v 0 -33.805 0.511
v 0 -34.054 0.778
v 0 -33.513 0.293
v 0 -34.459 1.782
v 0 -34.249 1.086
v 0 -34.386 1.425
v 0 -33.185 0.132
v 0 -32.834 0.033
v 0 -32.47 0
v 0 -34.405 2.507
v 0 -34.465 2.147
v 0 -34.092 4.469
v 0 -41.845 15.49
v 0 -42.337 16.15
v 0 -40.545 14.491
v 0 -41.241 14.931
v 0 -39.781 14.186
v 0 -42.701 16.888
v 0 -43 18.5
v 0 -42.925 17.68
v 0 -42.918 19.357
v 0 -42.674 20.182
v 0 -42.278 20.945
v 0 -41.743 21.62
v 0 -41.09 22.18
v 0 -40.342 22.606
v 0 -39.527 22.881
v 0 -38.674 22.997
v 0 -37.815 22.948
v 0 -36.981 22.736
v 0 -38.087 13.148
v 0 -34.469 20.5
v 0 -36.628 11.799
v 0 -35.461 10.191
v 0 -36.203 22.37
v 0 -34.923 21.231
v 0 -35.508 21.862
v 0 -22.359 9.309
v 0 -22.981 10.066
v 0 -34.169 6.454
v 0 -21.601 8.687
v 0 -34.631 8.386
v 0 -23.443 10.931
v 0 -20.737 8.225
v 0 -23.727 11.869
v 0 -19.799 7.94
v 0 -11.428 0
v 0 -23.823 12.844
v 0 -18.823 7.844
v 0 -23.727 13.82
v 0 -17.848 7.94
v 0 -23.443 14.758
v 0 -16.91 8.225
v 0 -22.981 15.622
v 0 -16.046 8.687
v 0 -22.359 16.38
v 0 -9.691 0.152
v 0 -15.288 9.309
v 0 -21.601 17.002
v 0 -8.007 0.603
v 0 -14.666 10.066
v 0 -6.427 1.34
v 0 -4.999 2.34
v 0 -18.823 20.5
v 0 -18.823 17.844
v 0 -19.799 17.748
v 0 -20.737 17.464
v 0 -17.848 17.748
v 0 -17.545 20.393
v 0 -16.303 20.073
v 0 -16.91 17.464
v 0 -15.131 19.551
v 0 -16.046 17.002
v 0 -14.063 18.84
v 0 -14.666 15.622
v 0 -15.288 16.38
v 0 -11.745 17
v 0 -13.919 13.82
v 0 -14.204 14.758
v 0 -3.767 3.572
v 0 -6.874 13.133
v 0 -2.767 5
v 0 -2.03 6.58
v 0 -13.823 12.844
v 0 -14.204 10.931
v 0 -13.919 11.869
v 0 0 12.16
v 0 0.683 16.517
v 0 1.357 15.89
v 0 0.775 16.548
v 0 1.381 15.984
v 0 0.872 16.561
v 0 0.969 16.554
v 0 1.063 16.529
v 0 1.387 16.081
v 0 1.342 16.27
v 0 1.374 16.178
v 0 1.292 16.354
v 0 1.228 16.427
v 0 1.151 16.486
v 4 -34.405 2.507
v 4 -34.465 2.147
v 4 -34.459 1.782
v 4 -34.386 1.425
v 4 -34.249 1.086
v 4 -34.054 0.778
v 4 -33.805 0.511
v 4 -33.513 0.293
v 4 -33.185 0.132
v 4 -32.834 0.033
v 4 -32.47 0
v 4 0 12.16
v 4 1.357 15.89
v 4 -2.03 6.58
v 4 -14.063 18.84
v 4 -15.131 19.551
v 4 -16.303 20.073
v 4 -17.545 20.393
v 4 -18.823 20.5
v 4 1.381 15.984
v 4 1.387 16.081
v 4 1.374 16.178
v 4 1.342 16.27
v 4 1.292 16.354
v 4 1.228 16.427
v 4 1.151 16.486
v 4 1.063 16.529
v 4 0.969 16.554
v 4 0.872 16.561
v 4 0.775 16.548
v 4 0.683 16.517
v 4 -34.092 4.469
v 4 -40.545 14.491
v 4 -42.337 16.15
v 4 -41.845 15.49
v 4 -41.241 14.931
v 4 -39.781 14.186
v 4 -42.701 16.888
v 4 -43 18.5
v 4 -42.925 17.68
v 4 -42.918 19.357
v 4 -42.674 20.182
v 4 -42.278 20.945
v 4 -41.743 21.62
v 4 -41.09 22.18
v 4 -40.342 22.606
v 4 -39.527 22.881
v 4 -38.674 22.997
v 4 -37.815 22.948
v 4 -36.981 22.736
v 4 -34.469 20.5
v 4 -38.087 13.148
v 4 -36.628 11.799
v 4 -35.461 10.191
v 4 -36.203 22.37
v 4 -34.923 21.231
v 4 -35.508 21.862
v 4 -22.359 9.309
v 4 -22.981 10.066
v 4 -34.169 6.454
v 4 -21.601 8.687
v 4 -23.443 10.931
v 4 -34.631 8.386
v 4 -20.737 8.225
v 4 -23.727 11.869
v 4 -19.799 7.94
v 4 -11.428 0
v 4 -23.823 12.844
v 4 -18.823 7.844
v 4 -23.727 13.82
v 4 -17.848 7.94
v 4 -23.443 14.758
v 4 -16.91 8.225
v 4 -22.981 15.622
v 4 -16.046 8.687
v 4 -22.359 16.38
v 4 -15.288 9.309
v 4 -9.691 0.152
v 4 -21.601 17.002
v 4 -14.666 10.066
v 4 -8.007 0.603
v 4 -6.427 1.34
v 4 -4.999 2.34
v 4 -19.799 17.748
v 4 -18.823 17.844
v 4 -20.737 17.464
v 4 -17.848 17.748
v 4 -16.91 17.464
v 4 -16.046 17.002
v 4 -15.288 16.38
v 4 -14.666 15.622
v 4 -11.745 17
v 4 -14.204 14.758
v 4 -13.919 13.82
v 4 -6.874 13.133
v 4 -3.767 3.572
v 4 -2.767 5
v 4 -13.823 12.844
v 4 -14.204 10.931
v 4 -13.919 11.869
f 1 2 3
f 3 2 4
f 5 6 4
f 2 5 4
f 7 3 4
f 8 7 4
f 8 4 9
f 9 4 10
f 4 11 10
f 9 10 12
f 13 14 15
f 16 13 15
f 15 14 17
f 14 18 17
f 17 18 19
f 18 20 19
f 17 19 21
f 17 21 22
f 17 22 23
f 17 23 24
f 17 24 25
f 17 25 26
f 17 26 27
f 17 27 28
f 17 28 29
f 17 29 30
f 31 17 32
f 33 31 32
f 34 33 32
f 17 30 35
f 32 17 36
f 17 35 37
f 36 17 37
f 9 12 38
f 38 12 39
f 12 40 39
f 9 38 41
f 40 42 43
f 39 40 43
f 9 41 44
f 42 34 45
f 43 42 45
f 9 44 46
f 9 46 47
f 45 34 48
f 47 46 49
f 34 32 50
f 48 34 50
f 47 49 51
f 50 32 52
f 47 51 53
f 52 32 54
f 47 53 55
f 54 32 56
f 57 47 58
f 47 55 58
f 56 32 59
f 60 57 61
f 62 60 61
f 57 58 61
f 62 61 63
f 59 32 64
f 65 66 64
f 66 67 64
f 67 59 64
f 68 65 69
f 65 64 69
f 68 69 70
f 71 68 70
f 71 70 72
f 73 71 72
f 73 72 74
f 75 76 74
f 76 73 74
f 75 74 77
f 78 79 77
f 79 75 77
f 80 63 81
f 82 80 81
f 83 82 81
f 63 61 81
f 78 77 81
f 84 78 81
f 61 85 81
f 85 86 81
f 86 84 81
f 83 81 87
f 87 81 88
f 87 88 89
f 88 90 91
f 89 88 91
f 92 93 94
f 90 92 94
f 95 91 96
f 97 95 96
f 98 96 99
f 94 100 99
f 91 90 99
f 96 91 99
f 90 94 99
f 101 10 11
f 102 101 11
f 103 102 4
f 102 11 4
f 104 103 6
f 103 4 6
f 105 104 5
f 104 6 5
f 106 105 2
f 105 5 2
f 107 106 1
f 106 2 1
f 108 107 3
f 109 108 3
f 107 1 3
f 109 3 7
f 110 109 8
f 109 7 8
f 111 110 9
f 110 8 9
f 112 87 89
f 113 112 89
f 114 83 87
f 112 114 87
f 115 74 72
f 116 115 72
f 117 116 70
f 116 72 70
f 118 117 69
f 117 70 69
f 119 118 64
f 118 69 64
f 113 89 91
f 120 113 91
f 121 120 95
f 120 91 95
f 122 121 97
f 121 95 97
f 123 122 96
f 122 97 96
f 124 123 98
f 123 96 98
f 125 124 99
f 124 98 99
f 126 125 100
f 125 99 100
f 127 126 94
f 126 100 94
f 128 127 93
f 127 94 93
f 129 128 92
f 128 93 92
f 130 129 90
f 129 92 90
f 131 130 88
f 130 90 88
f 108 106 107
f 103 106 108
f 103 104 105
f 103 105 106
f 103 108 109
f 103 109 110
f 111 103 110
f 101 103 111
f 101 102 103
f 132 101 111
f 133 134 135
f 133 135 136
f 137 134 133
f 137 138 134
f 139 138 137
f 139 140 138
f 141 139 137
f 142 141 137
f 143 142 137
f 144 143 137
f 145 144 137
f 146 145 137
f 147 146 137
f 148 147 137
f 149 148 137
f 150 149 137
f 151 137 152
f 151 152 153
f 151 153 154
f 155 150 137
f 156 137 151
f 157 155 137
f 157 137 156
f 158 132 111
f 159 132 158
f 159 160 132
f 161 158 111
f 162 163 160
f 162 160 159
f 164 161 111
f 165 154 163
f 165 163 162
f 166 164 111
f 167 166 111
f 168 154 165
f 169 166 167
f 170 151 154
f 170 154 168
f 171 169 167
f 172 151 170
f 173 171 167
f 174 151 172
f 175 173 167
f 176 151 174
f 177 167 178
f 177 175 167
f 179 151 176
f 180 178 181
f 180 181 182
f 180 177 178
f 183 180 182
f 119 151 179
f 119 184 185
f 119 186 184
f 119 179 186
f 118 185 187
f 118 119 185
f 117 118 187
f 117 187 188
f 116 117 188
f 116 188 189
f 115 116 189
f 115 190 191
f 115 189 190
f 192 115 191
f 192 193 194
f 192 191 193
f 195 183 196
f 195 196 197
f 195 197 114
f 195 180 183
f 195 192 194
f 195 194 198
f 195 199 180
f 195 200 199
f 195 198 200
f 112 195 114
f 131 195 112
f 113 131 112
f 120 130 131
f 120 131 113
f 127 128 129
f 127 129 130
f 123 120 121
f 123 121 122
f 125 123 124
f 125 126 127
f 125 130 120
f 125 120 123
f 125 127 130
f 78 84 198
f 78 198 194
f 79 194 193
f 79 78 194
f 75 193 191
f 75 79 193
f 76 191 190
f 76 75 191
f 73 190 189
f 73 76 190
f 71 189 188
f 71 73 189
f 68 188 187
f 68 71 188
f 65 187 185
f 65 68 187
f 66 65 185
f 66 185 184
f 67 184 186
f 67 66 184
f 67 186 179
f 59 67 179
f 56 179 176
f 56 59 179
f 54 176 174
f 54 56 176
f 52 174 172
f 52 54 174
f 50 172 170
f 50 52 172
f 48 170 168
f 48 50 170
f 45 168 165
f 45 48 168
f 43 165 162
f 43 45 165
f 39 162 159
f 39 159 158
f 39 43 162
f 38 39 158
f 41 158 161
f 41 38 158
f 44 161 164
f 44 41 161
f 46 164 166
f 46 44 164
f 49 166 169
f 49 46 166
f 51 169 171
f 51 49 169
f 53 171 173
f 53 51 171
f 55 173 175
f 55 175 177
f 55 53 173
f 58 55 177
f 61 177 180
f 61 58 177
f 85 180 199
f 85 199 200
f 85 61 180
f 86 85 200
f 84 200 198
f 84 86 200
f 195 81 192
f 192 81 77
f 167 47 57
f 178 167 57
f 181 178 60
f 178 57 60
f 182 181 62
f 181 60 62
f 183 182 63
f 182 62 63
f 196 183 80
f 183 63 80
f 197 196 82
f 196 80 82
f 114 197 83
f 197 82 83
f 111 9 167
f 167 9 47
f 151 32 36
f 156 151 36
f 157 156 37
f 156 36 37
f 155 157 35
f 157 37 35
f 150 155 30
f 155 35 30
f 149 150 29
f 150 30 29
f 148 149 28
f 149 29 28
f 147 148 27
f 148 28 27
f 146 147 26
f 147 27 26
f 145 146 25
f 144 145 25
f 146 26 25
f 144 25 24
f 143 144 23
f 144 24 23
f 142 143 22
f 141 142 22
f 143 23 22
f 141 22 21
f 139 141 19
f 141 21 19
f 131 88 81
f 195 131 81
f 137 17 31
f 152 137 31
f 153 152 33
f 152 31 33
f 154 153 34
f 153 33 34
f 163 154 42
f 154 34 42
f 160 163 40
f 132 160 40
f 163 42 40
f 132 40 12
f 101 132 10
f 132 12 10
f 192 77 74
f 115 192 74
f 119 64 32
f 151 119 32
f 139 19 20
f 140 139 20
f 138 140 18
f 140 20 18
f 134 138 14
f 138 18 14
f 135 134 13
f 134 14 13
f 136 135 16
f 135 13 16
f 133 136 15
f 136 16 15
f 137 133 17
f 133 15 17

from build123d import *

# Parameters (mm, degrees)
F0_R     = 5
F1_DEPTH = 4


with BuildPart() as f1:
    # F0 (on Right) → F1 (new body)
    with BuildSketch(Plane.YZ):
        with BuildLine():
            Line((-32.470462, 0), (-11.42762, 0))
            ThreePointArc((-11.42762, 0), (-5.691618, 1.808646), (-2.030496, 6.580344))
            Line((-2.030496, 6.580344), (0, 12.160091))
            Line((0, 12.160091), (1.357265, 15.88982))
            ThreePointArc((1.357265, 15.88982), (1.227999, 16.42686), (0.683047, 16.517132))
            Line((0.683047, 16.517132), (-6.873841, 13.132861))
            Line((-6.873841, 13.132861), (-11.745187, 17))
            Line((-11.745187, 17), (-14.06338, 18.840308))
            ThreePointArc((-14.06338, 18.840308), (-16.302877, 20.073179), (-18.823421, 20.5))
            Line((-18.823421, 20.5), (-34.468871, 20.5))
            ThreePointArc((-34.468871, 20.5), (-39.527112, 22.881214), (-43, 18.5))
            ThreePointArc((-43, 18.5), (-42.106403, 15.808558), (-39.780507, 14.186034))
            ThreePointArc((-39.780507, 14.186034), (-35.001825, 9.308972), (-34.405107, 2.507099))
            ThreePointArc((-34.405107, 2.507099), (-34.053845, 0.778157), (-32.470462, 0))
        make_face()
        with Locations((-18.823421, 12.844194)):
            Circle(F0_R, mode=Mode.SUBTRACT)
    extrude(amount=F1_DEPTH)


solid = f1.part
